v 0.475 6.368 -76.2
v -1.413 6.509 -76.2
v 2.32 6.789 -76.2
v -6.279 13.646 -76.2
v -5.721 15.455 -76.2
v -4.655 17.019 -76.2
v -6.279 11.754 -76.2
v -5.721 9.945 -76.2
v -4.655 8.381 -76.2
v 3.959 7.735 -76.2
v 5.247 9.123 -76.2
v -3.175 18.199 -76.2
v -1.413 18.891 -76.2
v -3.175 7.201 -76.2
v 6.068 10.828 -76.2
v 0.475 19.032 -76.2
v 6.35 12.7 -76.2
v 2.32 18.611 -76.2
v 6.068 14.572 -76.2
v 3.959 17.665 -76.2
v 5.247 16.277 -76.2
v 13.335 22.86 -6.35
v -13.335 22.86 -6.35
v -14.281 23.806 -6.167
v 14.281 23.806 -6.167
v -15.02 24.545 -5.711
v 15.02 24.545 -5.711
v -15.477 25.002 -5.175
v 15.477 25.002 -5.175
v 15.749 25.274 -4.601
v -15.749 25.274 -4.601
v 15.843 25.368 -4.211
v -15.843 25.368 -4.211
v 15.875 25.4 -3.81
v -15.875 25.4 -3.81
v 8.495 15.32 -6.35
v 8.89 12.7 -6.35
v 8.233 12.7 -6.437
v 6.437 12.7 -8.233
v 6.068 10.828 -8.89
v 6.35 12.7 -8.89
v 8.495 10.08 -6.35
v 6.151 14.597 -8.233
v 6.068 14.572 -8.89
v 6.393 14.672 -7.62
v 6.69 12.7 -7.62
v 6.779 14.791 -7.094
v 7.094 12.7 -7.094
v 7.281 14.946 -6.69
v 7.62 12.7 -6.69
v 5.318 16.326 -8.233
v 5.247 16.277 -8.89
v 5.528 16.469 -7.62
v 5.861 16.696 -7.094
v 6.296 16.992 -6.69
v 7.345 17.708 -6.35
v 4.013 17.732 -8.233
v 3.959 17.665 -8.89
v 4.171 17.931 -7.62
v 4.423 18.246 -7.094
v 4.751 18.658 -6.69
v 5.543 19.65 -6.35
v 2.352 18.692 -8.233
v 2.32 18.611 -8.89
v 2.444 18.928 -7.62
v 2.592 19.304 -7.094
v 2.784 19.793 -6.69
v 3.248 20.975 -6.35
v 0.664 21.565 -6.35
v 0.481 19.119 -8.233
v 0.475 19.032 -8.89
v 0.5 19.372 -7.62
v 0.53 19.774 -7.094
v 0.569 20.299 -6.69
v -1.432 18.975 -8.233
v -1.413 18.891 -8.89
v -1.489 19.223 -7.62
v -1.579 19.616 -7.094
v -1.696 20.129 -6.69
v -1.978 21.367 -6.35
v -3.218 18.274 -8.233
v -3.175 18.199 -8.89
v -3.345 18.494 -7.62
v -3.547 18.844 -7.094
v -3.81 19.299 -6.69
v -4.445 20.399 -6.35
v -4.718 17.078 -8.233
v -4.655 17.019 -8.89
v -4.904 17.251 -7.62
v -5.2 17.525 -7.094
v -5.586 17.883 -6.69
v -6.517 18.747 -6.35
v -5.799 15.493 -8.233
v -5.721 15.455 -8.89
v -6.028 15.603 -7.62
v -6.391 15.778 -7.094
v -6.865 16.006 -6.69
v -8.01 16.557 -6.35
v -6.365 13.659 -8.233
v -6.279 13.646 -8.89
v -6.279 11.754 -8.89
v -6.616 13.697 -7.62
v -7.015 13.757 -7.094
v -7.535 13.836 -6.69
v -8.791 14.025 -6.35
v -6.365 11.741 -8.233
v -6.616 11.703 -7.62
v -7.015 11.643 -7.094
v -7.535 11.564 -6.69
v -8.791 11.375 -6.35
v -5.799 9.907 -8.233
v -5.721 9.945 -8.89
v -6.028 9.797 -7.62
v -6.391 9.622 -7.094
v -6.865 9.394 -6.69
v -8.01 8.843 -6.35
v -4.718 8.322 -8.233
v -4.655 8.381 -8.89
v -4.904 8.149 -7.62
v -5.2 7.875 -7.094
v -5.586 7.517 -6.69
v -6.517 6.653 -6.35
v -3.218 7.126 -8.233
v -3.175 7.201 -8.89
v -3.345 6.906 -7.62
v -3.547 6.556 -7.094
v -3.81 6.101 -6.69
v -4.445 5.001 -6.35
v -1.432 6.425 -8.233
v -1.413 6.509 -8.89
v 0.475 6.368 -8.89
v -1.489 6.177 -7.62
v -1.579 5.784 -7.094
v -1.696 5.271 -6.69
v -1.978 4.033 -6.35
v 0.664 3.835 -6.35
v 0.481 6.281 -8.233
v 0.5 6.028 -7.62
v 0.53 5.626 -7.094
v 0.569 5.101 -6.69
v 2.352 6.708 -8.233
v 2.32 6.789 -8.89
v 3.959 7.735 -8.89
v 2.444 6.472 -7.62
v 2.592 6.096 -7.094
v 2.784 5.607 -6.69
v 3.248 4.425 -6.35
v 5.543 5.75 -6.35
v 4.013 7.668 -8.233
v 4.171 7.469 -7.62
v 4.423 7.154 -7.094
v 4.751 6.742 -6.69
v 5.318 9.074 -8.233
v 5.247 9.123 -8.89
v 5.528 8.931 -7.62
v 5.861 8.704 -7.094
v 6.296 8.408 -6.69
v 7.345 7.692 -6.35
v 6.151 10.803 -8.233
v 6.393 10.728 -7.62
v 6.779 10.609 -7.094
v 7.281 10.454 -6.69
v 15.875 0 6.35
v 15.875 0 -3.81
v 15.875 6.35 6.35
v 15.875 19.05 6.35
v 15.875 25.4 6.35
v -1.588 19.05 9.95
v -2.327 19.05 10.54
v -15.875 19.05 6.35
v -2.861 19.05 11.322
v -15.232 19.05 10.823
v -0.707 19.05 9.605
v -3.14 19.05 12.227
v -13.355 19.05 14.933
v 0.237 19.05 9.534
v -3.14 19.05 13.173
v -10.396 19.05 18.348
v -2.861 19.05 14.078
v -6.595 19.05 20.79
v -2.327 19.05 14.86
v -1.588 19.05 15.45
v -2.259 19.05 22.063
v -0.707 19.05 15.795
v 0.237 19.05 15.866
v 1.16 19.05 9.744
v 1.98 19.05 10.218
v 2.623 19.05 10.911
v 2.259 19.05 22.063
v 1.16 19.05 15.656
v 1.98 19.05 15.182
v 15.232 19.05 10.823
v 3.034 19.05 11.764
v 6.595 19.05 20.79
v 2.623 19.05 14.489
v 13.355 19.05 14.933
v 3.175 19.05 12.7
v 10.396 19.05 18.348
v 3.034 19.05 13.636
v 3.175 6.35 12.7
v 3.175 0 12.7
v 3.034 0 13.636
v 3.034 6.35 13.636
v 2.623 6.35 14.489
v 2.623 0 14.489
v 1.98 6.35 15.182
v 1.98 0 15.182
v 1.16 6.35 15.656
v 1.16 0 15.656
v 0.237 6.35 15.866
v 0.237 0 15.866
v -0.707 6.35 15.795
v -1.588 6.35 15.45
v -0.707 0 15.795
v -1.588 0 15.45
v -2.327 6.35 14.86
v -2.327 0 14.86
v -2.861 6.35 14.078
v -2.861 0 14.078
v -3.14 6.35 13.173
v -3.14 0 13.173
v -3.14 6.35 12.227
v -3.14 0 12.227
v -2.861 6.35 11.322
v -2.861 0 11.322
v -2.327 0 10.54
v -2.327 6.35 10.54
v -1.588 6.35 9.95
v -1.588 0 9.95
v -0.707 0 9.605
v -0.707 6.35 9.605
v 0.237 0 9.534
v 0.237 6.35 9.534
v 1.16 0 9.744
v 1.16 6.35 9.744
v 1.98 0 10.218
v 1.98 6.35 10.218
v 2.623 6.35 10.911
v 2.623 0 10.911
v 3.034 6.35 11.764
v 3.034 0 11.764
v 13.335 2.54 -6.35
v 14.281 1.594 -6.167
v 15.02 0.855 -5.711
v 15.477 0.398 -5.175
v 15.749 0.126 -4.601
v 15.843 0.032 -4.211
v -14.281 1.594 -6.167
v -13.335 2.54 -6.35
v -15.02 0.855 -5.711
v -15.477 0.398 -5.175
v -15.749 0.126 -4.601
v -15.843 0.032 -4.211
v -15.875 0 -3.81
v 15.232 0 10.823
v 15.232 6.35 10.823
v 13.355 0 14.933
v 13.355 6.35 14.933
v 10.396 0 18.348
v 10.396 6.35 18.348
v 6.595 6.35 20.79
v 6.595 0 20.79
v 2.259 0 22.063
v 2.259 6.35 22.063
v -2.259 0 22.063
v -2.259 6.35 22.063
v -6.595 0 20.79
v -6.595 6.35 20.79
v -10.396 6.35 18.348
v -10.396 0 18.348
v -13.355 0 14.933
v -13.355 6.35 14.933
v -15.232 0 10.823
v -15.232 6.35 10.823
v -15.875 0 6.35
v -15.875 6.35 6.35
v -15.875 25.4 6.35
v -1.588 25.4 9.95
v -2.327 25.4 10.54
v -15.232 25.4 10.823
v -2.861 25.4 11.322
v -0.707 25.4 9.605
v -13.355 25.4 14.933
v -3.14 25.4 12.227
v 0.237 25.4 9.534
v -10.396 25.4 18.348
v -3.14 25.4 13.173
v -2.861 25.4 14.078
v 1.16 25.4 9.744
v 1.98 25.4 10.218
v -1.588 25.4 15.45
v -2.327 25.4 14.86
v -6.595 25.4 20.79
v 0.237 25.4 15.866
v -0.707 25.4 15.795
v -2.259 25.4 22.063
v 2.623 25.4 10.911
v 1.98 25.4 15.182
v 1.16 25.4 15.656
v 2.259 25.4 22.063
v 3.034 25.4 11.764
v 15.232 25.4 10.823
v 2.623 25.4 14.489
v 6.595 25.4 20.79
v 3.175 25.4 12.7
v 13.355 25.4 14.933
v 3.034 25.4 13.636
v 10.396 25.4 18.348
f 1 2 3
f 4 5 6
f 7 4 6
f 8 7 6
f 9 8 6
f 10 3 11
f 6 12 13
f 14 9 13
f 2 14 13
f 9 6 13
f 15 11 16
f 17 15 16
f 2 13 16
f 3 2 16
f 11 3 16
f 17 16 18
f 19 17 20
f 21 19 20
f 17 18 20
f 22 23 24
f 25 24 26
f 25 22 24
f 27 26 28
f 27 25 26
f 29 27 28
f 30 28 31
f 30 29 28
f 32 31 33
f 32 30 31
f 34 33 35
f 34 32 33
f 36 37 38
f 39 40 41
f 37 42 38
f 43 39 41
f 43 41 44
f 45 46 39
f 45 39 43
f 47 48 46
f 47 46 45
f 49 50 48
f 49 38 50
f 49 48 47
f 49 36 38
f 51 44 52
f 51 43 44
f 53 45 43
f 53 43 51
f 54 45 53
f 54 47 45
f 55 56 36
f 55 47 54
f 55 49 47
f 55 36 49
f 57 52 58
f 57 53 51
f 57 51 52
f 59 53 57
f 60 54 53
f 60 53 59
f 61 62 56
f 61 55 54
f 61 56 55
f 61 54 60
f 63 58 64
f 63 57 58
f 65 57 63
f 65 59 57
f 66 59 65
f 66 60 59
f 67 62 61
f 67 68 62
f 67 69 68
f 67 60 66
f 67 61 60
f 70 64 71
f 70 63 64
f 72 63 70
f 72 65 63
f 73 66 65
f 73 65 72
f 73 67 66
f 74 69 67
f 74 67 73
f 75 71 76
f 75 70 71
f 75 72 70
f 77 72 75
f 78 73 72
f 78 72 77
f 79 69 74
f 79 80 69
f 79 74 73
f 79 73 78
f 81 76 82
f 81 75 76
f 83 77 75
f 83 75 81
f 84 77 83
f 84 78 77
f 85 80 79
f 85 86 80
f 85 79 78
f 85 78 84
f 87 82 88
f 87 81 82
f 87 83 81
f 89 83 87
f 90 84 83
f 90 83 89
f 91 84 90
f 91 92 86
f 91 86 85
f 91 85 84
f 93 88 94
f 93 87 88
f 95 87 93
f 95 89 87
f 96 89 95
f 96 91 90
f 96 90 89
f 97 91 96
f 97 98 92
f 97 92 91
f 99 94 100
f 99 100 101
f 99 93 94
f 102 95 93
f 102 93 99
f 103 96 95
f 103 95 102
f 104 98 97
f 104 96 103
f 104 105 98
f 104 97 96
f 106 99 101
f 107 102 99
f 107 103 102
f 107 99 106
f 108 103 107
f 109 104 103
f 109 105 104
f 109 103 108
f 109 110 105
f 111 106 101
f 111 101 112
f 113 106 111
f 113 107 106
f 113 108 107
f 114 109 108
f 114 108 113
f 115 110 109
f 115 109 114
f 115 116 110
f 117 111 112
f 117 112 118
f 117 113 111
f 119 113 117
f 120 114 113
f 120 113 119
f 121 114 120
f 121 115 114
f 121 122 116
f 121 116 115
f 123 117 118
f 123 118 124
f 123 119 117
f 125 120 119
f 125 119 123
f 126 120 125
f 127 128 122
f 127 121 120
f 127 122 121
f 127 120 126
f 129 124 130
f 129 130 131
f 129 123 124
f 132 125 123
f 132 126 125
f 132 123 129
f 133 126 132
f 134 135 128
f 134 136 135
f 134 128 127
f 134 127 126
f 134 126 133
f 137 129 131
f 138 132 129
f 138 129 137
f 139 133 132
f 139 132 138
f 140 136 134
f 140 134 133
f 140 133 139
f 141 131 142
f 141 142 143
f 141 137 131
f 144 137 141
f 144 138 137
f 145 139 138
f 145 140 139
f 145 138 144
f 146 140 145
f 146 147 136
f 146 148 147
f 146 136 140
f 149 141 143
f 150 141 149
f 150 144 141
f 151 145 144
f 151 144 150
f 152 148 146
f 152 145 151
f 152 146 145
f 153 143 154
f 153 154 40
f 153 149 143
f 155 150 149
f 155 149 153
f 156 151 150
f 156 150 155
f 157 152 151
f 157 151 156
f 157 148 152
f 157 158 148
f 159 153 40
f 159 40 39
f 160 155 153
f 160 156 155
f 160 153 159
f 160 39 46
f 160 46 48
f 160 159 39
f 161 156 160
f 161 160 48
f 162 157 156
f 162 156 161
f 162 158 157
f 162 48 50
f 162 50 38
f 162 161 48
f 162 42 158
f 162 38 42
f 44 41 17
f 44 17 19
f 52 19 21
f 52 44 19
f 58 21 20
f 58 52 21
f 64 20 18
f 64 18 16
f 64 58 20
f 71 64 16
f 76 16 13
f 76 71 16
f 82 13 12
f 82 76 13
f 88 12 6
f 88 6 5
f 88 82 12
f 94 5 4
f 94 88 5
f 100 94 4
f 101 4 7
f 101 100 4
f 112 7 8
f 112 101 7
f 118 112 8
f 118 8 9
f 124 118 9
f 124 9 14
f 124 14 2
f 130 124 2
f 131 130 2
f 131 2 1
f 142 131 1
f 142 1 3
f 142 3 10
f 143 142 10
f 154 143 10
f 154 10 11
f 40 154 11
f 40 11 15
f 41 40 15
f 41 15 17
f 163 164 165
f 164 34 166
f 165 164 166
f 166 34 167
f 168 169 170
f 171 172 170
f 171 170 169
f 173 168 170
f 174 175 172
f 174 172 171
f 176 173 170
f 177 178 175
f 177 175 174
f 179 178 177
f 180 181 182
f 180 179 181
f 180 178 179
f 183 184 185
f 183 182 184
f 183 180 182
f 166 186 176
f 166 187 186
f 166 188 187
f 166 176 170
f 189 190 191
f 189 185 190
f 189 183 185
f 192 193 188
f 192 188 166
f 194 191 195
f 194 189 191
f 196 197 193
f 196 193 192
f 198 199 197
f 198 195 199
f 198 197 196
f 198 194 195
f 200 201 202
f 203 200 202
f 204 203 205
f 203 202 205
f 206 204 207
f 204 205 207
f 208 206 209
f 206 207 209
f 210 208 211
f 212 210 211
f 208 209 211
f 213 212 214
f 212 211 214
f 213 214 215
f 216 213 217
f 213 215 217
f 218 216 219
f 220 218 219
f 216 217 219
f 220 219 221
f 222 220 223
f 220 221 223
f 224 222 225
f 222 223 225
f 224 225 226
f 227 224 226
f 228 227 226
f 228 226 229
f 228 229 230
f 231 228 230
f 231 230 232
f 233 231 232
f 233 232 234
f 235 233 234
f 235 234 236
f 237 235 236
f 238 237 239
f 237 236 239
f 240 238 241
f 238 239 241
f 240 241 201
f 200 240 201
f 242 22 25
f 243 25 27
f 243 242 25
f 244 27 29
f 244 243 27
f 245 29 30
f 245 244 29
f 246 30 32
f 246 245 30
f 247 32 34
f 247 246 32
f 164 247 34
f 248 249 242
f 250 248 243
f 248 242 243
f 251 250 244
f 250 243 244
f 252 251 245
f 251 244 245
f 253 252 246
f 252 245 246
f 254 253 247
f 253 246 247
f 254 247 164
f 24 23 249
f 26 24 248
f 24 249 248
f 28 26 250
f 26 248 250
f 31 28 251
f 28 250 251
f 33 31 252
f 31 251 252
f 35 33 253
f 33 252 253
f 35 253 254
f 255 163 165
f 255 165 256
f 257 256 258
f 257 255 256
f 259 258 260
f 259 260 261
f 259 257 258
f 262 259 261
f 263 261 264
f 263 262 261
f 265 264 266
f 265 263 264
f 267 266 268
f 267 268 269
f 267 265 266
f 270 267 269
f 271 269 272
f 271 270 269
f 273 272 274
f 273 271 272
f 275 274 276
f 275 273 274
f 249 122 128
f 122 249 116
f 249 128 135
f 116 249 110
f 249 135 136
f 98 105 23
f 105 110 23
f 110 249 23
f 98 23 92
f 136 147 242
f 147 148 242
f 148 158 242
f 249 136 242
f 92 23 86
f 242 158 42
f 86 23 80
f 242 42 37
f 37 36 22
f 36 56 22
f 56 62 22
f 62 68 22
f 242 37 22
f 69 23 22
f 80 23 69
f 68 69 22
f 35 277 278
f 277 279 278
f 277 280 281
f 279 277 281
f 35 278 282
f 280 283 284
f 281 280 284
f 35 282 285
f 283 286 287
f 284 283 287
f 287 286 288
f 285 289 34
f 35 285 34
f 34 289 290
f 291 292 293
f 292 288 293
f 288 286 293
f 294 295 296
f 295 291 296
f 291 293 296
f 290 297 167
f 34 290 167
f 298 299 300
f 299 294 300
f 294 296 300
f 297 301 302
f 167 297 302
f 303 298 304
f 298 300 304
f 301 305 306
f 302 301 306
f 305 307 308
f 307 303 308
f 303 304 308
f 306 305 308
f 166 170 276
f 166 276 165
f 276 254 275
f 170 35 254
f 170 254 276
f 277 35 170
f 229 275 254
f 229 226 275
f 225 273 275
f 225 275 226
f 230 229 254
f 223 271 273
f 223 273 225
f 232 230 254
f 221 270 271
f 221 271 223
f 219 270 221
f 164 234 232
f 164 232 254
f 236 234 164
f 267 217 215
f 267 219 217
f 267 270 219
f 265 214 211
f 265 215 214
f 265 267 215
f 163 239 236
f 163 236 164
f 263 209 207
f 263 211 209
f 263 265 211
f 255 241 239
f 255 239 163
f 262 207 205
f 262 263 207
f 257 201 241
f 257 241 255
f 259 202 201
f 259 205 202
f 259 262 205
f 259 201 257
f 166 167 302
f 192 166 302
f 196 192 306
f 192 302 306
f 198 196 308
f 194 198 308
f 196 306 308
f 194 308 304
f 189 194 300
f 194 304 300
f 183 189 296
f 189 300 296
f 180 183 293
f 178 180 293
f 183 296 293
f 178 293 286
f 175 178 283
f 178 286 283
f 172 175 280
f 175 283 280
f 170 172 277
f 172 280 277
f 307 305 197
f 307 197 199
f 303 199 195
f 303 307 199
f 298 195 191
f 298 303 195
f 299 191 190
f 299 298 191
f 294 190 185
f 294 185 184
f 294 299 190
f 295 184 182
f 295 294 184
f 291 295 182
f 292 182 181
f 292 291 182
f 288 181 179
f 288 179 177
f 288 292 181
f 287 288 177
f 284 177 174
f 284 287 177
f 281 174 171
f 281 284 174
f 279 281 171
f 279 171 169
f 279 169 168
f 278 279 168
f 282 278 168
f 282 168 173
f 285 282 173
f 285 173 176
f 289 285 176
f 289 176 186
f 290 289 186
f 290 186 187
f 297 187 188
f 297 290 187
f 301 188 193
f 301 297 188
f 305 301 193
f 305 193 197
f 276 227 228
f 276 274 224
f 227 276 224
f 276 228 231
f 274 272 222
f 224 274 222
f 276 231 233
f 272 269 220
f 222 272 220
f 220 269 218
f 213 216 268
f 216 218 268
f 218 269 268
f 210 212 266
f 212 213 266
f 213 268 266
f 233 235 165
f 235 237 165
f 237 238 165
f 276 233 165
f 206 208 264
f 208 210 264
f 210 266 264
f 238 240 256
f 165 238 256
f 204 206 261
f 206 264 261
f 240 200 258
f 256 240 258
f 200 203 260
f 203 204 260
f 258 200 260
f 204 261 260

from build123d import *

# Parameters (mm, degrees)
F6_R     = 3.175
F0_DEPTH = 6.35
F6_W     = 31.75
F6_H     = 12.7
F1_DEPTH = 12.7
F3_R     = 6.35
F4_DEPTH = 76.2
F5_R     = 2.54


with BuildPart() as f0:
    # F6 (on Front) → F0 (new body)
    with BuildSketch(Plane.XZ):
        with BuildLine():
            Line((-15.875, 6.35), (15.875, 6.35))
            ThreePointArc((15.875, 6.35), (0, 22.225), (-15.875, 6.35))
        make_face()
        with Locations((0, 12.7)):
            Circle(F6_R, mode=Mode.SUBTRACT)
    extrude(amount=-F0_DEPTH)

    # F6 (on Front) → F1 (join)
    with BuildSketch(Plane.XZ):
        Rectangle(F6_W, F6_H)
    extrude(amount=-F1_DEPTH)

    # F2: F0 across face


with BuildPart() as f0_1:
    add(f0.part)
    add(f0.part.mirror(Plane(origin=(0, 12.7, 0), x_dir=(1, 0, 0), z_dir=(0, 1, 0))))

    # F3 (on Top) → F4 (join)
    with BuildSketch(Plane.XY):
        with Locations((0, 12.7)):
            Circle(F3_R)
    extrude(amount=-F4_DEPTH)

    # F5
    f5_edges = [f0_1.edges().sort_by_distance(p)[0] for p in [
        (-15.875, 12.7, -6.35),
        (0, 25.4, -6.35),
        (0, 0, -6.35),
        (15.875, 12.7, -6.35),
        (-6.35, 12.7, -6.35),
    ]]
    fillet(f5_edges, radius=F5_R)


solid = f0_1.part
